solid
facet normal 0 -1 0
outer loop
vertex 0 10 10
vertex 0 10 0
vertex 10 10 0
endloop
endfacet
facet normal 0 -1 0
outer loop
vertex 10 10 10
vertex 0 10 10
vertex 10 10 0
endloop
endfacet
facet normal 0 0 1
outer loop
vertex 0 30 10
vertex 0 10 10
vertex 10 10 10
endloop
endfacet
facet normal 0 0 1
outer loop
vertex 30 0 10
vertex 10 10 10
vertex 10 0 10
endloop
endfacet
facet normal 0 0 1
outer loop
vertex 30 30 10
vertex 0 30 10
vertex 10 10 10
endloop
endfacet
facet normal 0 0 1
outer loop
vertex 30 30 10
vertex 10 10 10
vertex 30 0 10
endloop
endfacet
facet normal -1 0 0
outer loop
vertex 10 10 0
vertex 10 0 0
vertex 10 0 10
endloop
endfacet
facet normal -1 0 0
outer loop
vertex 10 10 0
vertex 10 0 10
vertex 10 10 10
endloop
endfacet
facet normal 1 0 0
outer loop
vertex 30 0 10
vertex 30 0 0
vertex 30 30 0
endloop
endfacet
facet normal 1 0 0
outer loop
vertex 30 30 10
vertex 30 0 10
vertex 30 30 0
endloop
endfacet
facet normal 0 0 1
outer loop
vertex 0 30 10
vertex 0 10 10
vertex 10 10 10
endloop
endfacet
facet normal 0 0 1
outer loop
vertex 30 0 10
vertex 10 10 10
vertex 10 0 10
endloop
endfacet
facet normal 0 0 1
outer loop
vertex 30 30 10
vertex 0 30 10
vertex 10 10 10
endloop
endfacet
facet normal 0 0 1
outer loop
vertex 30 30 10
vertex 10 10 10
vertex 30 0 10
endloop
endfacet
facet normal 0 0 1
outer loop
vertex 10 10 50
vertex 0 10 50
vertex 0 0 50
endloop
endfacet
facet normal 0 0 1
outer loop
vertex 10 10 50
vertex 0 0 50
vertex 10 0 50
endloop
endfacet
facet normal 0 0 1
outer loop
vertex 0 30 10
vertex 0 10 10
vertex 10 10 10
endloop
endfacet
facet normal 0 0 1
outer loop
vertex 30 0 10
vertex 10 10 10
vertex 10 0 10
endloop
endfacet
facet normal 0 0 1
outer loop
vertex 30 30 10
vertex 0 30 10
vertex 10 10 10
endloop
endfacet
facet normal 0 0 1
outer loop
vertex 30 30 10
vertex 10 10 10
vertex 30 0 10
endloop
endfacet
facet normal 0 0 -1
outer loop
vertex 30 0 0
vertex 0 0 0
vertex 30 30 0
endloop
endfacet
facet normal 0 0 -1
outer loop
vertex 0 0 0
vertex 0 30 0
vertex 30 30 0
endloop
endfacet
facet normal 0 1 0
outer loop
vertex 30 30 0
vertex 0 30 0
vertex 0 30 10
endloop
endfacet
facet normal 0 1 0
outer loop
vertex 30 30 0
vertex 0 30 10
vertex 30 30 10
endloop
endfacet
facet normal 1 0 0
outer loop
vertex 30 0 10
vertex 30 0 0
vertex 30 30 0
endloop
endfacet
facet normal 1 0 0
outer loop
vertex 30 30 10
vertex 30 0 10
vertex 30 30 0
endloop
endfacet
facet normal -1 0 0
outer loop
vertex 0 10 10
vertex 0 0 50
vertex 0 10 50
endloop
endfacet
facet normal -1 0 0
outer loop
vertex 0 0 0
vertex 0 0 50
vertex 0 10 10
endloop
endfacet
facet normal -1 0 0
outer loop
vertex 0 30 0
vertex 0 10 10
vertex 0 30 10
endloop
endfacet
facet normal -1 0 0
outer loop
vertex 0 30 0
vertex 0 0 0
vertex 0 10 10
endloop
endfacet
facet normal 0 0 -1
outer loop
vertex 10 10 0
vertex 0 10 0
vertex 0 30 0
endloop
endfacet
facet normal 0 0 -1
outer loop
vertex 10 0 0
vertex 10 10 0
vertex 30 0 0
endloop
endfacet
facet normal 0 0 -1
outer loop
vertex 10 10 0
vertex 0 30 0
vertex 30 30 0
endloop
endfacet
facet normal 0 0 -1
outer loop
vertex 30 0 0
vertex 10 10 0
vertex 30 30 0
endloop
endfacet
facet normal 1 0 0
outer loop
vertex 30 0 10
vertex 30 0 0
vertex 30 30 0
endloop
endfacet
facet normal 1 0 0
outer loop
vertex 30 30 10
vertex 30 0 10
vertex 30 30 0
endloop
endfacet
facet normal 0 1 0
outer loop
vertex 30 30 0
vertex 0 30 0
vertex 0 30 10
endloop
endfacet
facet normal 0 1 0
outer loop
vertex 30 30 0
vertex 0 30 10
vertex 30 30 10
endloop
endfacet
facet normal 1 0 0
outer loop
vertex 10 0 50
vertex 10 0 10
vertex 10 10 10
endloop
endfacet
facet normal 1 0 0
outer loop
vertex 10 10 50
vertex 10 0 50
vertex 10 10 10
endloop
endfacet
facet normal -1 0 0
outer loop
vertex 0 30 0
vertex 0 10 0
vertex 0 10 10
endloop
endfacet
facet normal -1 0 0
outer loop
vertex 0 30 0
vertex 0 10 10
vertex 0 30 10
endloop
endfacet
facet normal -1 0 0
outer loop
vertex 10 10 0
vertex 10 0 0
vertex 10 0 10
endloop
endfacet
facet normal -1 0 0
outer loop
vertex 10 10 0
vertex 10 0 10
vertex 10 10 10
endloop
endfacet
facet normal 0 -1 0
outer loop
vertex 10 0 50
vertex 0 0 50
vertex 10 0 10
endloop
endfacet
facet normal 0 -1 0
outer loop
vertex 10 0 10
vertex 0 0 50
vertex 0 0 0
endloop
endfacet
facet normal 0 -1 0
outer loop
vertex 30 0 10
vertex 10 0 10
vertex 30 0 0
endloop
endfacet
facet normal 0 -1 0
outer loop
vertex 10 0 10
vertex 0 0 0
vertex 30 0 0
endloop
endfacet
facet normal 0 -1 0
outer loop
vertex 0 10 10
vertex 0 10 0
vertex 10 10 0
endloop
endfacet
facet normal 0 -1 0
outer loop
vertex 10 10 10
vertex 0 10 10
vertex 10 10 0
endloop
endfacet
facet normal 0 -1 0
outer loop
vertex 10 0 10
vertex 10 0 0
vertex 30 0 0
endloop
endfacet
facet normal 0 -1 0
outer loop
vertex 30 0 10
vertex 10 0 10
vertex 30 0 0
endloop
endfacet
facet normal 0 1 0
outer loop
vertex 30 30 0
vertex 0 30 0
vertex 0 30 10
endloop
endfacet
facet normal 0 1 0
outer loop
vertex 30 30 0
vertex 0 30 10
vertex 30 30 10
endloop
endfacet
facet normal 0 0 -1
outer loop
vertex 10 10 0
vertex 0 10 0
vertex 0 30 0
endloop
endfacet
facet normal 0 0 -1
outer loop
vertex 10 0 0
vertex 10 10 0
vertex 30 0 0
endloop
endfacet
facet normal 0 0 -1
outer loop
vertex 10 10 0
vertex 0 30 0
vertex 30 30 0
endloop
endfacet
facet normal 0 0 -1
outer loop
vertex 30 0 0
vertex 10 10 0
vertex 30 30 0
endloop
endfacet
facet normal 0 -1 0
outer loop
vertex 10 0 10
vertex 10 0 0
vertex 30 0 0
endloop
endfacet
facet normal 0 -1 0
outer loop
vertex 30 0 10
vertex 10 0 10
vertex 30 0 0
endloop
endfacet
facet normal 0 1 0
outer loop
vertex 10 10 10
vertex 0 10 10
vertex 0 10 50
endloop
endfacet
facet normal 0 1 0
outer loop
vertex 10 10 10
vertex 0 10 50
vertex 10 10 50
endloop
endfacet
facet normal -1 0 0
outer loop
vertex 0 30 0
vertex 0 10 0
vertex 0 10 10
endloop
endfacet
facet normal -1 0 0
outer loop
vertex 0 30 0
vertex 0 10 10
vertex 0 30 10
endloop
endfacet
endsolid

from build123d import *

# Parameters (mm, degrees)
BOX_W        = 10
BOX_H        = 10
BOX_DEPTH    = 50
BOX001_W     = 30
BOX001_H     = 30
BOX001_DEPTH = 10


with BuildPart() as torre:
    # Box → Box (new body)
    with BuildSketch(Plane.XY):
        with Locations((5, 5)):
            Rectangle(BOX_W, BOX_H)
    extrude(amount=BOX_DEPTH)


with BuildPart() as base:
    # Box001 → Box001 (new body)
    with BuildSketch(Plane.XY):
        with Locations((15, 15)):
            Rectangle(BOX001_W, BOX001_H)
    extrude(amount=BOX001_DEPTH)


with BuildPart() as cut:
    # Cut base: copy of Base
    add(base.part)

    # Cut: cut Torre
    add(torre.part, mode=Mode.SUBTRACT)


with BuildPart() as cut001:
    # Cut001 base: copy of Base
    add(base.part)

    # Cut001: cut Torre
    add(torre.part, mode=Mode.SUBTRACT)


with BuildPart() as fusion:
    # Fusion base: copy of Base
    add(base.part)

    # Fusion: union Torre
    add(torre.part)


solid = Compound([cut.part, cut001.part, fusion.part])
